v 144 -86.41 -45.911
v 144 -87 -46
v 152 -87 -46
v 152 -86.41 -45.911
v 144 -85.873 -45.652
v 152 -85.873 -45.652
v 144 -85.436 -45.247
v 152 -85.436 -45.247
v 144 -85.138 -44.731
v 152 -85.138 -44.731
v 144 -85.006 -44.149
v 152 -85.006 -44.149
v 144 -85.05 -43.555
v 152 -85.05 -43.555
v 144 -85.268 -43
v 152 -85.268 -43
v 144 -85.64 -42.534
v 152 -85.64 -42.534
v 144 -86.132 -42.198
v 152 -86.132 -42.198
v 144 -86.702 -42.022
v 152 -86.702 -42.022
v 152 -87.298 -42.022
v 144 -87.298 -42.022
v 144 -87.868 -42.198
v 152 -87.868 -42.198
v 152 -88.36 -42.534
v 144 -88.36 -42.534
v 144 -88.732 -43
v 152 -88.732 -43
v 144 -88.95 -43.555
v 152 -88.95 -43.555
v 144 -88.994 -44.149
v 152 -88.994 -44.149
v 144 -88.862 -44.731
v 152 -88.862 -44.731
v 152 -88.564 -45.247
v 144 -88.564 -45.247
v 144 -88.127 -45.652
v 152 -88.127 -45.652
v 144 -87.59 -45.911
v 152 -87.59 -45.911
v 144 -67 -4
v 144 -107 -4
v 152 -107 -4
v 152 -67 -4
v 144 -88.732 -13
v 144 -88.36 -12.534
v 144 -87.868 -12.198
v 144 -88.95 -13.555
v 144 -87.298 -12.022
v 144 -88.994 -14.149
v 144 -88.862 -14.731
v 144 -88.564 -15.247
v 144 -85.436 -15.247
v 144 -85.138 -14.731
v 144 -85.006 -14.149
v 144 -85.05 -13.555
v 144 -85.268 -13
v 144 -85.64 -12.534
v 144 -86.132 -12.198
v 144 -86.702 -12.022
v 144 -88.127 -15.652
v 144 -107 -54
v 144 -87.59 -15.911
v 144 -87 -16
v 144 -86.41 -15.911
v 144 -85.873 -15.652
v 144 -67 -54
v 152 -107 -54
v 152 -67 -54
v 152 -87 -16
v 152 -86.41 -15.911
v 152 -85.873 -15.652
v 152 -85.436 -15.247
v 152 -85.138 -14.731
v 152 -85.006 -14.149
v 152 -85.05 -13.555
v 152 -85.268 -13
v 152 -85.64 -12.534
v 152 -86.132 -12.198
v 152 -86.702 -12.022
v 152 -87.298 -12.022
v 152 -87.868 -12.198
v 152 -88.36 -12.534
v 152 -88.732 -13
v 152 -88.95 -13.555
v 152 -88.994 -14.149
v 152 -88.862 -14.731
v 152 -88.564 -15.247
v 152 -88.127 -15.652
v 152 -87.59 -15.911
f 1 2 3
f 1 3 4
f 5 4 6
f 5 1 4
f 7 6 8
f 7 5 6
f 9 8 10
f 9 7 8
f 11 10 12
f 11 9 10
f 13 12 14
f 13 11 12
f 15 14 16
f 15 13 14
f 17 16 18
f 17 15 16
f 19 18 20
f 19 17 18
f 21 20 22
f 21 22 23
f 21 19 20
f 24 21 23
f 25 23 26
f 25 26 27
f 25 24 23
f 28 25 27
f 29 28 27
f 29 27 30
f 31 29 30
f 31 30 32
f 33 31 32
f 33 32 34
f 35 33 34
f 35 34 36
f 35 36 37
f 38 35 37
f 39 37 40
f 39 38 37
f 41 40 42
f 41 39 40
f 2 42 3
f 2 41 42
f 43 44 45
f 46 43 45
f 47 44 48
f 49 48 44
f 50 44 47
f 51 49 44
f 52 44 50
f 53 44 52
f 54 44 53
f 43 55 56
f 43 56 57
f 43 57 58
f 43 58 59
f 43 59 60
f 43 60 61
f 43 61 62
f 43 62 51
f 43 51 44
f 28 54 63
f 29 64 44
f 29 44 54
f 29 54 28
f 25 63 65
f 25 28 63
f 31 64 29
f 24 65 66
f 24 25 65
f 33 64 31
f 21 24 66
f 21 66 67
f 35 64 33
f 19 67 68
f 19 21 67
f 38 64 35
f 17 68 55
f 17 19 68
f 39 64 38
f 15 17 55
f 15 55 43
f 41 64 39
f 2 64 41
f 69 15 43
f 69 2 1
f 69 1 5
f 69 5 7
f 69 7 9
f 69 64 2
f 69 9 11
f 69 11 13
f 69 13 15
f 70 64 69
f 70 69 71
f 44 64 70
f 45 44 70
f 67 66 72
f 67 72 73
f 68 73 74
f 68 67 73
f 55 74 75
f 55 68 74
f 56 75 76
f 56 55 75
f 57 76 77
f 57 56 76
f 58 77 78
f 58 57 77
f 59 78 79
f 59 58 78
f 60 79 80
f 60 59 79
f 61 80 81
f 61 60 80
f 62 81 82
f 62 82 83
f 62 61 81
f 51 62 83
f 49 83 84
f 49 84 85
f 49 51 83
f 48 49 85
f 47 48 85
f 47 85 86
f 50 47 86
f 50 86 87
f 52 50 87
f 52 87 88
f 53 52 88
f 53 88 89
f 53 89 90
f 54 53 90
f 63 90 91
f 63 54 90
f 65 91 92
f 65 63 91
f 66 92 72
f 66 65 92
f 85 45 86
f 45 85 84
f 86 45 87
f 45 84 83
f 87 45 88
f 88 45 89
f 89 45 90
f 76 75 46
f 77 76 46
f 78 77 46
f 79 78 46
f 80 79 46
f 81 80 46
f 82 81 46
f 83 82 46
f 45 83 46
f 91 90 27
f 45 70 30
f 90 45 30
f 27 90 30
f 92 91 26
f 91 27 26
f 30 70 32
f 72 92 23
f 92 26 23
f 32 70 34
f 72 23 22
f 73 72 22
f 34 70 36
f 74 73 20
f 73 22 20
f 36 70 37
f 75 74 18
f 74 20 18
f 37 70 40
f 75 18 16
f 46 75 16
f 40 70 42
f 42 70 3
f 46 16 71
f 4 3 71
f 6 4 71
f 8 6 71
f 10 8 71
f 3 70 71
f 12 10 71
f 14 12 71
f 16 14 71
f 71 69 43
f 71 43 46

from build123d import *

# Parameters (mm, degrees)
CYLINDER029_R           = 2
CYLINDER029_DEPTH       = 8
CYLINDER029_PITCH_ANGLE = 90
ARRAY027_Z_COUNT        = 2
ARRAY027_Z_PITCH        = 30
BOX017_W                = 8
BOX017_H                = 40
BOX017_DEPTH            = 50


with BuildPart() as array027:
    # Cylinder029 → Cylinder029 (new body)
    with BuildSketch(Plane.XY):
        Circle(CYLINDER029_R)
    extrude(amount=CYLINDER029_DEPTH)


with BuildPart() as array027_1:
    # Cylinder029 pitch: moved
    add(array027.part.rotate(Axis((0, 0, 0), (0, 1, 0)), CYLINDER029_PITCH_ANGLE))


with BuildPart() as array027_2:
    # Cylinder029 placement: moved
    add(array027_1.part.moved(Location((144, -87, -14))))

    # Array027 Z: Array027 ×2


with BuildPart() as array027_3:
    add(array027_2.part)
    with Locations(*[(0, 0, -i * ARRAY027_Z_PITCH) for i in range(1, ARRAY027_Z_COUNT)]):
        add(array027_2.part)


with BuildPart() as case_2_con005:
    # Box017 → Box017 (new body)
    with BuildSketch(Plane(origin=(144, -107, -54), x_dir=(1, 0, 0), z_dir=(0, 0, 1))):
        with Locations((4, 20)):
            Rectangle(BOX017_W, BOX017_H)
    extrude(amount=BOX017_DEPTH)

    # Cut028: cut Array027
    add(array027_3.part, mode=Mode.SUBTRACT)


solid = case_2_con005.part
